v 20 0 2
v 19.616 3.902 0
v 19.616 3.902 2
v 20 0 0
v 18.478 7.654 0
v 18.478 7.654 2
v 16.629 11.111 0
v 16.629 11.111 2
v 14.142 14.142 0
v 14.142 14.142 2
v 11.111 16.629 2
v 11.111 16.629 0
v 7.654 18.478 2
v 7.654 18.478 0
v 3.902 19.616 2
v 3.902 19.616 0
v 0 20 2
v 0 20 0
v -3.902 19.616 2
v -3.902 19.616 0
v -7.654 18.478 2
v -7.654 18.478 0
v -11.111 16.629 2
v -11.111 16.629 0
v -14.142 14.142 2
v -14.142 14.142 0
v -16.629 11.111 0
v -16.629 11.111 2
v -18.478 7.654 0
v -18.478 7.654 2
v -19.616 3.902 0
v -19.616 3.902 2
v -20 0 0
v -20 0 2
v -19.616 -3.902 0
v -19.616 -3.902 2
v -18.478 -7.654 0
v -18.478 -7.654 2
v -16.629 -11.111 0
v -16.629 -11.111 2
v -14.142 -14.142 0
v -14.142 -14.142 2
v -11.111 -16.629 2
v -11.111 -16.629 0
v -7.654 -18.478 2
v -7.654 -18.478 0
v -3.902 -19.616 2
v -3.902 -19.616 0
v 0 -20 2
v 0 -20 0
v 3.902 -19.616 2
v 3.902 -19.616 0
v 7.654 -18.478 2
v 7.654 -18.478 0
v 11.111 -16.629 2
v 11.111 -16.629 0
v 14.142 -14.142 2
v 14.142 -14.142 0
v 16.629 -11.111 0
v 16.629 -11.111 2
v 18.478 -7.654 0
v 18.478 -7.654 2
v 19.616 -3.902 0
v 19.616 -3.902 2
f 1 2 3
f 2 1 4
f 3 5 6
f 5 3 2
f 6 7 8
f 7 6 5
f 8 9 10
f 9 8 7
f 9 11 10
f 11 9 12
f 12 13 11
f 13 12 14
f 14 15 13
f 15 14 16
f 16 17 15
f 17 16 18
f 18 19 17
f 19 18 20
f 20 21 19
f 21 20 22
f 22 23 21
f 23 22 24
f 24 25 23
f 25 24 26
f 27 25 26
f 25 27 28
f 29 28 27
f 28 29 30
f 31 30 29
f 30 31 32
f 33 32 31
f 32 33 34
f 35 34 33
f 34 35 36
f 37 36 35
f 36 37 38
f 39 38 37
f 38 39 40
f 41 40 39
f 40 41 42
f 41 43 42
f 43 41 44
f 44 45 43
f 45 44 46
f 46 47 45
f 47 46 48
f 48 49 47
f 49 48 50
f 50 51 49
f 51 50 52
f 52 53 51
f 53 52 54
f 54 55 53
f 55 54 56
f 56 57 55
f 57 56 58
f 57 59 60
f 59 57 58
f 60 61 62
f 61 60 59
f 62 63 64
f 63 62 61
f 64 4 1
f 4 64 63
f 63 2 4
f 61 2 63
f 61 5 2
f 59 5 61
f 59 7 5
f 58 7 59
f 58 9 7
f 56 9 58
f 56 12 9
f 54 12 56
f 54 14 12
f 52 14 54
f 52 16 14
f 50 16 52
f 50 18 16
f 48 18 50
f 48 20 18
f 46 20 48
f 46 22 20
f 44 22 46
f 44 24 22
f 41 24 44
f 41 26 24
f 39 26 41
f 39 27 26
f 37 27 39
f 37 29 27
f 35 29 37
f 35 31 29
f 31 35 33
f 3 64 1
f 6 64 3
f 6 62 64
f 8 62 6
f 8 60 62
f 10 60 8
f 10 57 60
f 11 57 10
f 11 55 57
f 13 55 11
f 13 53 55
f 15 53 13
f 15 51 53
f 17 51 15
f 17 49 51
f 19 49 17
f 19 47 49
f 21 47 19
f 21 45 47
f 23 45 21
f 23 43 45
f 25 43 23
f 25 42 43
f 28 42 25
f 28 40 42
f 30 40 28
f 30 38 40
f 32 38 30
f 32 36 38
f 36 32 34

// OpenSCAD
life_token_r = 40/2;
character_token_r = 47/2;
vote_token_r = 25/2;
effect_token_r = 25/2;
pip_token_r = 12/2;
alignment_token_r = 15/2;

shroud_x = 20;
shroud_y = 35.5;
shroud_tab_y = 8.5;

info_tag_x = 47;
info_tag_y = 58;
info_tag_corner_r = 3.5;
info_tag_offset_x = info_tag_x-info_tag_corner_r*2;
info_tag_offset_y = info_tag_y-info_tag_corner_r*2;

token_z = 2;
$fn=32;

module token(radius) {
    cylinder(r=radius,h=token_z);
}

module life_token() {
    token(life_token_r);
}

module character_token() {
    token(character_token_r);
}

module vote_token() {
    token(vote_token_r);
}

module effect_token() {
    token(effect_token_r);
}

module alignment_token() {
    token(alignment_token_r);
}

module pip_token() {
    token(pip_token_r);
}

module info_tag() {
    hull() {
        cylinder(r=info_tag_corner_r, h = token_z);
        translate([info_tag_offset_x, info_tag_offset_y, 0]) cylinder(r=info_tag_corner_r, h = token_z);
        translate([0, info_tag_offset_y, 0]) cylinder(r=info_tag_corner_r, h = token_z);
        translate([info_tag_offset_x, 0, 0]) cylinder(r=info_tag_corner_r, h = token_z);
    }
}

module shroud() {
    difference() {
        cube([shroud_x, shroud_y, token_z*2]);
        translate([shroud_x/2,-50*sqrt(2)+shroud_x/2, 0]) rotate([0,0,45]) cube([100, 100, 100], center=true);
        translate([shroud_x/2,shroud_y/4,token_z]) #character_token();
    }
}
render() {
    life_token(); // 18 (townsfolk) + 5 (traveller)
    // character_token(); // 103
    // vote_token(); // 20
    // effect_token(); // 125
    // alignment_token(); // 22
    // pip_token(); // 34
    // info_tag(); // 12
    // shroud(); // 18
}
